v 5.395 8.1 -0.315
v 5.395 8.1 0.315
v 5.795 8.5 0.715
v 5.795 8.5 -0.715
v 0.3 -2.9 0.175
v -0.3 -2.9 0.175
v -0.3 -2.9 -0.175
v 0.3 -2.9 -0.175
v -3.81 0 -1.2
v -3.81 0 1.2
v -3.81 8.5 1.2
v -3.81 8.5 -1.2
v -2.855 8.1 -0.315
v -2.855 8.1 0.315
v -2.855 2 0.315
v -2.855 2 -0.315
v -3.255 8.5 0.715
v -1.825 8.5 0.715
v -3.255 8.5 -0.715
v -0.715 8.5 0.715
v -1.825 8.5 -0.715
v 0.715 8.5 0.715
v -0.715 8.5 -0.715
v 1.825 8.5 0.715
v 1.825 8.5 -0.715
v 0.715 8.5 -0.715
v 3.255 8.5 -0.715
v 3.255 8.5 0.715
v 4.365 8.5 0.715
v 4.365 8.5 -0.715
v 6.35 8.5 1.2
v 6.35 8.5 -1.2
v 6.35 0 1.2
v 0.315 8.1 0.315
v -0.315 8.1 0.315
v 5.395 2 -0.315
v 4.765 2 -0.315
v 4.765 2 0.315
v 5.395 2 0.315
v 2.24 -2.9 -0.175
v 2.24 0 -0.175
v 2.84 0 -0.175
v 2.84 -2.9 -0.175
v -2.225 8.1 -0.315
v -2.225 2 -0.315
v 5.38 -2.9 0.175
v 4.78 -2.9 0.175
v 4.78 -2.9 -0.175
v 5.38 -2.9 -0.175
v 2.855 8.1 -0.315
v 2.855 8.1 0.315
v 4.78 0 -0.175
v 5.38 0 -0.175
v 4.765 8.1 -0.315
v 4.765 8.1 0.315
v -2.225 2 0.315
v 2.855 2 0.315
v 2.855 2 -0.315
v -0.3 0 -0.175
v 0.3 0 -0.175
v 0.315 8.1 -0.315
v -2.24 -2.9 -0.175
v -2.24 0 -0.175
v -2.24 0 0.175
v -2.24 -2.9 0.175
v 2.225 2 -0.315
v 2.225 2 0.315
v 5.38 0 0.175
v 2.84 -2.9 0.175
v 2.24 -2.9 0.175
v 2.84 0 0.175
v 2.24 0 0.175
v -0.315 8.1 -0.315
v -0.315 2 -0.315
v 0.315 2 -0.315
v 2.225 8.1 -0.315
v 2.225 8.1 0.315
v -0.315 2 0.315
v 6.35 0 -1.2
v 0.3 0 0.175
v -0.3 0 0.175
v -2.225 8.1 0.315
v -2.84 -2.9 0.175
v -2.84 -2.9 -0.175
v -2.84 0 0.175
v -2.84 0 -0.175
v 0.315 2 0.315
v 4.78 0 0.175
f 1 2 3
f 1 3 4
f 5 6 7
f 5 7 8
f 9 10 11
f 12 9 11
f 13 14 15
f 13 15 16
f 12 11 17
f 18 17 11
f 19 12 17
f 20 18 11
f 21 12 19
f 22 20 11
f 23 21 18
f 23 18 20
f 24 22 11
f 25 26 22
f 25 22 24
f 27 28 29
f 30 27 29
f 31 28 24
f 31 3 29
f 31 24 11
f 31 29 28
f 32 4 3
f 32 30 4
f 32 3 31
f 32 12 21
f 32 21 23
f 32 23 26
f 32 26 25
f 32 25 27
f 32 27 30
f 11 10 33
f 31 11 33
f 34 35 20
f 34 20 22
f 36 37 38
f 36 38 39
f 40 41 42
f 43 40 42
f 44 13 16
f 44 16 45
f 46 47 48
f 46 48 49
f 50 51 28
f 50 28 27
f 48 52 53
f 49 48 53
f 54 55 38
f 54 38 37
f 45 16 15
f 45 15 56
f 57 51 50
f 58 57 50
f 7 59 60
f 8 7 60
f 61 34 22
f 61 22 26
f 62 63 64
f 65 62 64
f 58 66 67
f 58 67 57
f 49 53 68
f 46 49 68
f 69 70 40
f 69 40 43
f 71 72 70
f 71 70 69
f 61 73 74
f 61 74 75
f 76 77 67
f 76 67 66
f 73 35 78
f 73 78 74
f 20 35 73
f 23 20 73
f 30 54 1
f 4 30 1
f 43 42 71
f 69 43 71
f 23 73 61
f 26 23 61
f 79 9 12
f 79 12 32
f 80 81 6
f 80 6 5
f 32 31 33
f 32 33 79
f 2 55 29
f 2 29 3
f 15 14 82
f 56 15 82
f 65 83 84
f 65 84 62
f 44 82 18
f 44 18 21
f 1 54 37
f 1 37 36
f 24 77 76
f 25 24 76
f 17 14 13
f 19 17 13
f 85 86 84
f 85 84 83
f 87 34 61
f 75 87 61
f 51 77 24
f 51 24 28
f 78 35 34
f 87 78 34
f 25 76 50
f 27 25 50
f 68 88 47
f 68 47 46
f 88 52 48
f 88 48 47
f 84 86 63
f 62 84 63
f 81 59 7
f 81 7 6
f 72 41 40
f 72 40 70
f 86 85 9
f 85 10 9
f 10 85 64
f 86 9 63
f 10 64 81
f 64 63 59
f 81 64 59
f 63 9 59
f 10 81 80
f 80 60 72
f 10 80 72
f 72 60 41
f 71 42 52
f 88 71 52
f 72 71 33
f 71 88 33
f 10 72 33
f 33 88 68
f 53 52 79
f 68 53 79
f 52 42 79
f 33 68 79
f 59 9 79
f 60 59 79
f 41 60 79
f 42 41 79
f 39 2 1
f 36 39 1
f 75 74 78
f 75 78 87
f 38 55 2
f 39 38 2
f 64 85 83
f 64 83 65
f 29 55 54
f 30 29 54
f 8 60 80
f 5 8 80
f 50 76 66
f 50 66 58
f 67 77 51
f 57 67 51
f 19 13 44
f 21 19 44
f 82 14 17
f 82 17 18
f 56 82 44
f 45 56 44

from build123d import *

# Parameters (mm, degrees)
SKETCH1_W           = 38.1
SKETCH1_H           = 2.4
BOSS_EXTRUDE1_DEPTH = 8.5
SKETCH2_W           = 0.63
SKETCH2_H           = 0.63
CUT_EXTRUDE1_DEPTH  = 6.5
SKETCH3_W           = 0.6
SKETCH3_H           = 0.35
BOSS_EXTRUDE2_DEPTH = 2.9
CHAMFER1_SIZE       = 0.4
SKETCH4_W           = 19.378829163
SKETCH4_H           = 4.471478983
CUT_EXTRUDE2_DEPTH  = 23.232914789
SKETCH7_W           = 15.24
SKETCH7_H           = 12.363721619
CUT_EXTRUDE3_DEPTH  = 21.997916563


with BuildPart() as part:
    # Sketch1 → Boss-Extrude1 (new body)
    with BuildSketch(Plane(origin=(0, 0, 0), x_dir=(1, 0, 0), z_dir=(0, 1, 0))):
        Rectangle(SKETCH1_W, SKETCH1_H)
    extrude(amount=BOSS_EXTRUDE1_DEPTH)

    # Sketch2 → Cut-Extrude1 (cut)
    with BuildSketch(Plane(origin=(0, 8.5, 0), x_dir=(1, 0, 0), z_dir=(0, 1, 0))):
        with Locations((-15.24, 0)):
            Rectangle(SKETCH2_W, SKETCH2_H)
        with Locations((-17.78, 0)):
            Rectangle(SKETCH2_W, SKETCH2_H)
        with Locations((-12.7, 0)):
            Rectangle(SKETCH2_W, SKETCH2_H)
        with Locations((-10.16, 0)):
            Rectangle(SKETCH2_W, SKETCH2_H)
        with Locations((-7.62, 0)):
            Rectangle(SKETCH2_W, SKETCH2_H)
        with Locations((-5.08, 0)):
            Rectangle(SKETCH2_W, SKETCH2_H)
        with Locations((-2.54, 0)):
            Rectangle(SKETCH2_W, SKETCH2_H)
        Rectangle(SKETCH2_W, SKETCH2_H)
        with Locations((2.54, 0)):
            Rectangle(SKETCH2_W, SKETCH2_H)
        with Locations((5.08, 0)):
            Rectangle(SKETCH2_W, SKETCH2_H)
        with Locations((7.62, 0)):
            Rectangle(SKETCH2_W, SKETCH2_H)
        with Locations((10.16, 0)):
            Rectangle(SKETCH2_W, SKETCH2_H)
        with Locations((12.7, 0)):
            Rectangle(SKETCH2_W, SKETCH2_H)
        with Locations((15.24, 0)):
            Rectangle(SKETCH2_W, SKETCH2_H)
        with Locations((17.78, 0)):
            Rectangle(SKETCH2_W, SKETCH2_H)
    extrude(amount=-CUT_EXTRUDE1_DEPTH, mode=Mode.SUBTRACT)

    # Sketch3 → Boss-Extrude2 (add)
    with BuildSketch(Plane.XZ):
        with Locations((-15.24, 0)):
            Rectangle(SKETCH3_W, SKETCH3_H)
        with Locations((-17.78, 0)):
            Rectangle(SKETCH3_W, SKETCH3_H)
        with Locations((-12.7, 0)):
            Rectangle(SKETCH3_W, SKETCH3_H)
        with Locations((-10.16, 0)):
            Rectangle(SKETCH3_W, SKETCH3_H)
        with Locations((-7.62, 0)):
            Rectangle(SKETCH3_W, SKETCH3_H)
        with Locations((-5.08, 0)):
            Rectangle(SKETCH3_W, SKETCH3_H)
        with Locations((-2.54, 0)):
            Rectangle(SKETCH3_W, SKETCH3_H)
        Rectangle(SKETCH3_W, SKETCH3_H)
        with Locations((2.54, 0)):
            Rectangle(SKETCH3_W, SKETCH3_H)
        with Locations((5.08, 0)):
            Rectangle(SKETCH3_W, SKETCH3_H)
        with Locations((7.62, 0)):
            Rectangle(SKETCH3_W, SKETCH3_H)
        with Locations((10.16, 0)):
            Rectangle(SKETCH3_W, SKETCH3_H)
        with Locations((12.7, 0)):
            Rectangle(SKETCH3_W, SKETCH3_H)
        with Locations((15.24, 0)):
            Rectangle(SKETCH3_W, SKETCH3_H)
        with Locations((17.78, 0)):
            Rectangle(SKETCH3_W, SKETCH3_H)
    extrude(amount=BOSS_EXTRUDE2_DEPTH)

    # Chamfer1
    chamfer1_edges = [part.edges().sort_by_distance(p)[0] for p in [
        (2.855, 8.5, 0),
        (2.54, 8.5, -0.315),
        (2.225, 8.5, 0),
        (2.54, 8.5, 0.315),
        (5.395, 8.5, 0),
        (5.08, 8.5, -0.315),
        (4.765, 8.5, 0),
        (5.08, 8.5, 0.315),
        (7.935, 8.5, 0),
        (7.62, 8.5, -0.315),
        (7.305, 8.5, 0),
        (7.62, 8.5, 0.315),
        (10.475, 8.5, 0),
        (10.16, 8.5, -0.315),
        (9.845, 8.5, 0),
        (10.16, 8.5, 0.315),
        (13.015, 8.5, 0),
        (12.7, 8.5, -0.315),
        (12.385, 8.5, 0),
        (12.7, 8.5, 0.315),
        (15.555, 8.5, 0),
        (15.24, 8.5, -0.315),
        (14.925, 8.5, 0),
        (15.24, 8.5, 0.315),
        (18.095, 8.5, 0),
        (17.78, 8.5, -0.315),
        (17.465, 8.5, 0),
        (17.78, 8.5, 0.315),
        (-17.465, 8.5, 0),
        (-17.78, 8.5, -0.315),
        (-18.095, 8.5, 0),
        (-17.78, 8.5, 0.315),
        (-14.925, 8.5, 0),
        (-15.24, 8.5, -0.315),
        (-15.555, 8.5, 0),
        (-15.24, 8.5, 0.315),
        (-12.385, 8.5, 0),
        (-12.7, 8.5, -0.315),
        (-13.015, 8.5, 0),
        (-12.7, 8.5, 0.315),
        (-9.845, 8.5, 0),
        (-10.16, 8.5, -0.315),
        (-10.475, 8.5, 0),
        (-10.16, 8.5, 0.315),
        (-7.305, 8.5, 0),
        (-7.62, 8.5, -0.315),
        (-7.935, 8.5, 0),
        (-7.62, 8.5, 0.315),
        (-4.765, 8.5, 0),
        (-5.08, 8.5, -0.315),
        (-5.395, 8.5, 0),
        (-5.08, 8.5, 0.315),
        (-2.225, 8.5, 0),
        (-2.54, 8.5, -0.315),
        (-2.855, 8.5, 0),
        (-2.54, 8.5, 0.315),
        (0.315, 8.5, 0),
        (0, 8.5, -0.315),
        (-0.315, 8.5, 0),
        (0, 8.5, 0.315),
    ]]
    chamfer(chamfer1_edges, length=CHAMFER1_SIZE)

    # Sketch4 → Cut-Extrude2 (cut, through all)
    with BuildSketch(Plane(origin=(0, 8.5, 0), x_dir=(1, 0, 0), z_dir=(0, 1, 0))):
        with Locations((16.039414582, -0.096925096)):
            Rectangle(SKETCH4_W, SKETCH4_H)
    extrude(amount=-CUT_EXTRUDE2_DEPTH, mode=Mode.SUBTRACT)

    # Sketch7 → Cut-Extrude3 (cut, through all)
    with BuildSketch(Plane.XY.offset(1.2)):
        with Locations((-11.43, 2.318139191)):
            Rectangle(SKETCH7_W, SKETCH7_H)
    extrude(amount=-CUT_EXTRUDE3_DEPTH, mode=Mode.SUBTRACT)


solid = part.part
